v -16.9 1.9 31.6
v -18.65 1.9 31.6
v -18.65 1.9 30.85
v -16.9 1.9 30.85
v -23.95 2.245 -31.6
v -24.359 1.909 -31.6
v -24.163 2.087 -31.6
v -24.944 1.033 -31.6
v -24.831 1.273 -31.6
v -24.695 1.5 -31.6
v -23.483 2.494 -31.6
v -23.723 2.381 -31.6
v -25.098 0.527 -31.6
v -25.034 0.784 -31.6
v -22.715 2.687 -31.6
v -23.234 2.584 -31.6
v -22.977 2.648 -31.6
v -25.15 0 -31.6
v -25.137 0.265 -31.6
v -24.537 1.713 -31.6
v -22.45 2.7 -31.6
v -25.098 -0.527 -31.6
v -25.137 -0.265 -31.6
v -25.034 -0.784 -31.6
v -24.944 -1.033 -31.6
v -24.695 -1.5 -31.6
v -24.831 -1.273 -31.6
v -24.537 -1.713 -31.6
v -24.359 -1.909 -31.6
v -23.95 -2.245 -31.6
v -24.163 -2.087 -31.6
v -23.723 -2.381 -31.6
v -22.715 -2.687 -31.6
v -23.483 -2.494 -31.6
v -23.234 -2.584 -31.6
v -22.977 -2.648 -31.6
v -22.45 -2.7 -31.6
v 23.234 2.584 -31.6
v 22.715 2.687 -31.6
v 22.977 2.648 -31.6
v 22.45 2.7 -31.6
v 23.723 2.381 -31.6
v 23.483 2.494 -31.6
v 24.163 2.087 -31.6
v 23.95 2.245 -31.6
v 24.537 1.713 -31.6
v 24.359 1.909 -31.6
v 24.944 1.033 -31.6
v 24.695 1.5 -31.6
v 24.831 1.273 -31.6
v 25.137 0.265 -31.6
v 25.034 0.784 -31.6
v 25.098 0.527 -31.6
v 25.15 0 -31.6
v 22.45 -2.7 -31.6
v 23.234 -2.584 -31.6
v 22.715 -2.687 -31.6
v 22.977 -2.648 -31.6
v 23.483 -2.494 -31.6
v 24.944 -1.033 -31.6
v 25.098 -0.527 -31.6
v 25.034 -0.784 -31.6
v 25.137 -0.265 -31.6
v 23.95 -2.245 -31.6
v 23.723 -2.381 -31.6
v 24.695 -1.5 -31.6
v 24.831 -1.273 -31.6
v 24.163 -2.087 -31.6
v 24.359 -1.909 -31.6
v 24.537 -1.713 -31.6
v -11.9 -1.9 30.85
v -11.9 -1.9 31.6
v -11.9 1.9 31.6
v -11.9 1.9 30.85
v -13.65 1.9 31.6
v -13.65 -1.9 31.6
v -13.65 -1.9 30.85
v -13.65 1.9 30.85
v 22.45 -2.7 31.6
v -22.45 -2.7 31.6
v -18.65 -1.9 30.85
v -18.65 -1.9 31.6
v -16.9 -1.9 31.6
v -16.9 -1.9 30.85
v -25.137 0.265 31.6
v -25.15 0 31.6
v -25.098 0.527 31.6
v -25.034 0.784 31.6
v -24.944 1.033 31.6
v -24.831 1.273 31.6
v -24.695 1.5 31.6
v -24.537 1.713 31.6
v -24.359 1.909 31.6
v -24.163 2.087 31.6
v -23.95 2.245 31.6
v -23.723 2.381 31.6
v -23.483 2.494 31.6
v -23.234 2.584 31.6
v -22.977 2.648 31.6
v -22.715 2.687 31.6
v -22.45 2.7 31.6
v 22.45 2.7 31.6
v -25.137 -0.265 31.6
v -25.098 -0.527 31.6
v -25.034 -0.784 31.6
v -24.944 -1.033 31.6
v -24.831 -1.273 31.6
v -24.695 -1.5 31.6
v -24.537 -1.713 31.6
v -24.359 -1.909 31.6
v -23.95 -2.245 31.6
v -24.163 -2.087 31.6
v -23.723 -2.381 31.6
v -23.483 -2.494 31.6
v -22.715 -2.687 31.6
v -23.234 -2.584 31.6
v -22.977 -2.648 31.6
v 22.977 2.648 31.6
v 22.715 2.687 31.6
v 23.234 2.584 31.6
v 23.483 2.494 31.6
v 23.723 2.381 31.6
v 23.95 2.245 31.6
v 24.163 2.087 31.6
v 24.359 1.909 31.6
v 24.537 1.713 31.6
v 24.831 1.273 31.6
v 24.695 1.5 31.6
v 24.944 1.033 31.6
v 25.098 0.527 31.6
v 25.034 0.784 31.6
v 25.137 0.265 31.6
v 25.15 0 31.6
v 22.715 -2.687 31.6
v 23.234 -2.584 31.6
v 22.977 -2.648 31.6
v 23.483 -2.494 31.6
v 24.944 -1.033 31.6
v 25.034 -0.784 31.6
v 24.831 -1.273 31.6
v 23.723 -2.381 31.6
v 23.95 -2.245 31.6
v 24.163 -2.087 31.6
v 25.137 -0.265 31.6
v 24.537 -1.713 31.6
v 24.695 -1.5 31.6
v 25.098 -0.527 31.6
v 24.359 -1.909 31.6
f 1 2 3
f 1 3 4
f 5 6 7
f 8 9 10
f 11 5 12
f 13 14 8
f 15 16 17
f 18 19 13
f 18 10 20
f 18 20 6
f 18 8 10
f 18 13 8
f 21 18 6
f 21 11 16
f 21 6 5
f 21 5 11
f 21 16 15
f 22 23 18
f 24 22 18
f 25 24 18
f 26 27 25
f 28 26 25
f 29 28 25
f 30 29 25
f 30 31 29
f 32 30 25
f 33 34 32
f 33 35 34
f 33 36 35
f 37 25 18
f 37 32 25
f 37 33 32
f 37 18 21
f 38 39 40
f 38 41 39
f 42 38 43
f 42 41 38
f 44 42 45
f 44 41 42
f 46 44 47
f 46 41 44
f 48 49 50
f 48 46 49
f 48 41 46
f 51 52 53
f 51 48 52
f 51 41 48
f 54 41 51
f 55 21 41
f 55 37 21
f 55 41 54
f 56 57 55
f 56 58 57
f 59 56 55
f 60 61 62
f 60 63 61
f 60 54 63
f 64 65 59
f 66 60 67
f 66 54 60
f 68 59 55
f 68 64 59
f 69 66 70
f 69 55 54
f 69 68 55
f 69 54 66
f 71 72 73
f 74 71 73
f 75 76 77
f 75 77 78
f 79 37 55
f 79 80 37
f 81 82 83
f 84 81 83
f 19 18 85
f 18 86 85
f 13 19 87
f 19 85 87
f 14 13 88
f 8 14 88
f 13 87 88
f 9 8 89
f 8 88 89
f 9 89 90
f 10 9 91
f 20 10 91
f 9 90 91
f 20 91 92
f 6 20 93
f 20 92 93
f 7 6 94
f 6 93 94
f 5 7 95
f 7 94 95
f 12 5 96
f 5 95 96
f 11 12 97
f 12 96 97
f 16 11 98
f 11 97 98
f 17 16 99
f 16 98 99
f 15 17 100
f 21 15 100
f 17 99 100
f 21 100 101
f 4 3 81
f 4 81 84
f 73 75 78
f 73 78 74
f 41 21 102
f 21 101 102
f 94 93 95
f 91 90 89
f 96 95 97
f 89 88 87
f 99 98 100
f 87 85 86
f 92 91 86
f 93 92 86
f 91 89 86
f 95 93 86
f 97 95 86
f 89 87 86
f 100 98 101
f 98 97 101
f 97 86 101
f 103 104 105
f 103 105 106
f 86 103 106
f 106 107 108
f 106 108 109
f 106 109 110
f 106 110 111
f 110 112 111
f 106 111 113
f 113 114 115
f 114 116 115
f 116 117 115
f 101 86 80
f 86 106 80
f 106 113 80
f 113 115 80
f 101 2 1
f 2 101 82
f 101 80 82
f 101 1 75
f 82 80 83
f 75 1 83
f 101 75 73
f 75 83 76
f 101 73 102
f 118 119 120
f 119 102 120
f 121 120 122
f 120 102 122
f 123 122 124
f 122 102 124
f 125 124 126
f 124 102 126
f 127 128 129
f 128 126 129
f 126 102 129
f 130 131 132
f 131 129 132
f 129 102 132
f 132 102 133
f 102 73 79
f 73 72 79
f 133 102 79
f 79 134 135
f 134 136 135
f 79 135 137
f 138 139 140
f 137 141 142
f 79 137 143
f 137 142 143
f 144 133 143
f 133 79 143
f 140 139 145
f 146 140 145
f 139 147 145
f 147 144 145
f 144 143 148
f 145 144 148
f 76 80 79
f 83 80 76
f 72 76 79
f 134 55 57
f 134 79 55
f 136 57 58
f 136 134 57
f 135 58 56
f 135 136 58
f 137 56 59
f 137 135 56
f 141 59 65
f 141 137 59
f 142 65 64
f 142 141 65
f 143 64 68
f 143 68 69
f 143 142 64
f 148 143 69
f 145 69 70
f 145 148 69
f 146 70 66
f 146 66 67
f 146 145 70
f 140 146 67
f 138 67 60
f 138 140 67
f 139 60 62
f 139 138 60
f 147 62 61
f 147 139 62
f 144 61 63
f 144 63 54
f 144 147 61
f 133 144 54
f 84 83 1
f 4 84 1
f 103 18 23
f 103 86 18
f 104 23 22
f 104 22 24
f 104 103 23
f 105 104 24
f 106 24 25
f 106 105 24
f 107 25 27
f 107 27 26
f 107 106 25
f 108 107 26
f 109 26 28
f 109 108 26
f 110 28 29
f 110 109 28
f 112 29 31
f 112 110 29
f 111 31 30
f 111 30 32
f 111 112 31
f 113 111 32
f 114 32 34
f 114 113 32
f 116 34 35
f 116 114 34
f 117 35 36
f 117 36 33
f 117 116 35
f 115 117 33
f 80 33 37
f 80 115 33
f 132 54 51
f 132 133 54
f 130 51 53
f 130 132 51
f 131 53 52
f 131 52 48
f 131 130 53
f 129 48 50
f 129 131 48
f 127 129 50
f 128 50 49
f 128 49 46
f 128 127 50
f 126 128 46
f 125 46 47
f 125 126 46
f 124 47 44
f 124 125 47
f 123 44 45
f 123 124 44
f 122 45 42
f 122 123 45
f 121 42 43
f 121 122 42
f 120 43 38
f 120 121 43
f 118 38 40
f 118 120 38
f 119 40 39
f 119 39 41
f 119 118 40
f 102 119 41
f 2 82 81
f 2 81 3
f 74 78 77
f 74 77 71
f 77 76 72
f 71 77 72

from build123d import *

# Parameters (mm, degrees)
F0_W     = 50.3
F0_H     = 63.2
F1_DEPTH = 2.7
F2_R     = 2.69999
F3_W     = 1.75
F3_H     = 3.8
F4_DEPTH = 0.75


# Not quite as in the source:
# - a fillet or chamfer is up to 0.001 mm smaller than in the source, because OpenCascade refuses the exact size


with BuildPart() as f1:
    # F0 (on Front) → F1 (new body, symmetric)
    with BuildSketch(Plane.XZ):
        Rectangle(F0_W, F0_H)
    extrude(amount=F1_DEPTH, both=True)

    # F2 (radius 2.7 in the source; OpenCascade refuses exactly that, so slightly less here)
    f2_edges = [f1.edges().sort_by_distance(p)[0] for p in [
        (25.15, 2.7, 0),
        (25.15, -2.7, 0),
        (-25.15, -2.7, 0),
        (-25.15, 2.7, 0),
    ]]
    fillet(f2_edges, radius=F2_R)

    # F3 (on face) → F4 (cut)
    with BuildSketch(Plane.XY.offset(31.6)):
        with Locations((-17.775, 0)):
            Rectangle(F3_W, F3_H)
        with Locations((-12.775, 0)):
            Rectangle(F3_W, F3_H)
    extrude(amount=-F4_DEPTH, mode=Mode.SUBTRACT)


solid = f1.part
